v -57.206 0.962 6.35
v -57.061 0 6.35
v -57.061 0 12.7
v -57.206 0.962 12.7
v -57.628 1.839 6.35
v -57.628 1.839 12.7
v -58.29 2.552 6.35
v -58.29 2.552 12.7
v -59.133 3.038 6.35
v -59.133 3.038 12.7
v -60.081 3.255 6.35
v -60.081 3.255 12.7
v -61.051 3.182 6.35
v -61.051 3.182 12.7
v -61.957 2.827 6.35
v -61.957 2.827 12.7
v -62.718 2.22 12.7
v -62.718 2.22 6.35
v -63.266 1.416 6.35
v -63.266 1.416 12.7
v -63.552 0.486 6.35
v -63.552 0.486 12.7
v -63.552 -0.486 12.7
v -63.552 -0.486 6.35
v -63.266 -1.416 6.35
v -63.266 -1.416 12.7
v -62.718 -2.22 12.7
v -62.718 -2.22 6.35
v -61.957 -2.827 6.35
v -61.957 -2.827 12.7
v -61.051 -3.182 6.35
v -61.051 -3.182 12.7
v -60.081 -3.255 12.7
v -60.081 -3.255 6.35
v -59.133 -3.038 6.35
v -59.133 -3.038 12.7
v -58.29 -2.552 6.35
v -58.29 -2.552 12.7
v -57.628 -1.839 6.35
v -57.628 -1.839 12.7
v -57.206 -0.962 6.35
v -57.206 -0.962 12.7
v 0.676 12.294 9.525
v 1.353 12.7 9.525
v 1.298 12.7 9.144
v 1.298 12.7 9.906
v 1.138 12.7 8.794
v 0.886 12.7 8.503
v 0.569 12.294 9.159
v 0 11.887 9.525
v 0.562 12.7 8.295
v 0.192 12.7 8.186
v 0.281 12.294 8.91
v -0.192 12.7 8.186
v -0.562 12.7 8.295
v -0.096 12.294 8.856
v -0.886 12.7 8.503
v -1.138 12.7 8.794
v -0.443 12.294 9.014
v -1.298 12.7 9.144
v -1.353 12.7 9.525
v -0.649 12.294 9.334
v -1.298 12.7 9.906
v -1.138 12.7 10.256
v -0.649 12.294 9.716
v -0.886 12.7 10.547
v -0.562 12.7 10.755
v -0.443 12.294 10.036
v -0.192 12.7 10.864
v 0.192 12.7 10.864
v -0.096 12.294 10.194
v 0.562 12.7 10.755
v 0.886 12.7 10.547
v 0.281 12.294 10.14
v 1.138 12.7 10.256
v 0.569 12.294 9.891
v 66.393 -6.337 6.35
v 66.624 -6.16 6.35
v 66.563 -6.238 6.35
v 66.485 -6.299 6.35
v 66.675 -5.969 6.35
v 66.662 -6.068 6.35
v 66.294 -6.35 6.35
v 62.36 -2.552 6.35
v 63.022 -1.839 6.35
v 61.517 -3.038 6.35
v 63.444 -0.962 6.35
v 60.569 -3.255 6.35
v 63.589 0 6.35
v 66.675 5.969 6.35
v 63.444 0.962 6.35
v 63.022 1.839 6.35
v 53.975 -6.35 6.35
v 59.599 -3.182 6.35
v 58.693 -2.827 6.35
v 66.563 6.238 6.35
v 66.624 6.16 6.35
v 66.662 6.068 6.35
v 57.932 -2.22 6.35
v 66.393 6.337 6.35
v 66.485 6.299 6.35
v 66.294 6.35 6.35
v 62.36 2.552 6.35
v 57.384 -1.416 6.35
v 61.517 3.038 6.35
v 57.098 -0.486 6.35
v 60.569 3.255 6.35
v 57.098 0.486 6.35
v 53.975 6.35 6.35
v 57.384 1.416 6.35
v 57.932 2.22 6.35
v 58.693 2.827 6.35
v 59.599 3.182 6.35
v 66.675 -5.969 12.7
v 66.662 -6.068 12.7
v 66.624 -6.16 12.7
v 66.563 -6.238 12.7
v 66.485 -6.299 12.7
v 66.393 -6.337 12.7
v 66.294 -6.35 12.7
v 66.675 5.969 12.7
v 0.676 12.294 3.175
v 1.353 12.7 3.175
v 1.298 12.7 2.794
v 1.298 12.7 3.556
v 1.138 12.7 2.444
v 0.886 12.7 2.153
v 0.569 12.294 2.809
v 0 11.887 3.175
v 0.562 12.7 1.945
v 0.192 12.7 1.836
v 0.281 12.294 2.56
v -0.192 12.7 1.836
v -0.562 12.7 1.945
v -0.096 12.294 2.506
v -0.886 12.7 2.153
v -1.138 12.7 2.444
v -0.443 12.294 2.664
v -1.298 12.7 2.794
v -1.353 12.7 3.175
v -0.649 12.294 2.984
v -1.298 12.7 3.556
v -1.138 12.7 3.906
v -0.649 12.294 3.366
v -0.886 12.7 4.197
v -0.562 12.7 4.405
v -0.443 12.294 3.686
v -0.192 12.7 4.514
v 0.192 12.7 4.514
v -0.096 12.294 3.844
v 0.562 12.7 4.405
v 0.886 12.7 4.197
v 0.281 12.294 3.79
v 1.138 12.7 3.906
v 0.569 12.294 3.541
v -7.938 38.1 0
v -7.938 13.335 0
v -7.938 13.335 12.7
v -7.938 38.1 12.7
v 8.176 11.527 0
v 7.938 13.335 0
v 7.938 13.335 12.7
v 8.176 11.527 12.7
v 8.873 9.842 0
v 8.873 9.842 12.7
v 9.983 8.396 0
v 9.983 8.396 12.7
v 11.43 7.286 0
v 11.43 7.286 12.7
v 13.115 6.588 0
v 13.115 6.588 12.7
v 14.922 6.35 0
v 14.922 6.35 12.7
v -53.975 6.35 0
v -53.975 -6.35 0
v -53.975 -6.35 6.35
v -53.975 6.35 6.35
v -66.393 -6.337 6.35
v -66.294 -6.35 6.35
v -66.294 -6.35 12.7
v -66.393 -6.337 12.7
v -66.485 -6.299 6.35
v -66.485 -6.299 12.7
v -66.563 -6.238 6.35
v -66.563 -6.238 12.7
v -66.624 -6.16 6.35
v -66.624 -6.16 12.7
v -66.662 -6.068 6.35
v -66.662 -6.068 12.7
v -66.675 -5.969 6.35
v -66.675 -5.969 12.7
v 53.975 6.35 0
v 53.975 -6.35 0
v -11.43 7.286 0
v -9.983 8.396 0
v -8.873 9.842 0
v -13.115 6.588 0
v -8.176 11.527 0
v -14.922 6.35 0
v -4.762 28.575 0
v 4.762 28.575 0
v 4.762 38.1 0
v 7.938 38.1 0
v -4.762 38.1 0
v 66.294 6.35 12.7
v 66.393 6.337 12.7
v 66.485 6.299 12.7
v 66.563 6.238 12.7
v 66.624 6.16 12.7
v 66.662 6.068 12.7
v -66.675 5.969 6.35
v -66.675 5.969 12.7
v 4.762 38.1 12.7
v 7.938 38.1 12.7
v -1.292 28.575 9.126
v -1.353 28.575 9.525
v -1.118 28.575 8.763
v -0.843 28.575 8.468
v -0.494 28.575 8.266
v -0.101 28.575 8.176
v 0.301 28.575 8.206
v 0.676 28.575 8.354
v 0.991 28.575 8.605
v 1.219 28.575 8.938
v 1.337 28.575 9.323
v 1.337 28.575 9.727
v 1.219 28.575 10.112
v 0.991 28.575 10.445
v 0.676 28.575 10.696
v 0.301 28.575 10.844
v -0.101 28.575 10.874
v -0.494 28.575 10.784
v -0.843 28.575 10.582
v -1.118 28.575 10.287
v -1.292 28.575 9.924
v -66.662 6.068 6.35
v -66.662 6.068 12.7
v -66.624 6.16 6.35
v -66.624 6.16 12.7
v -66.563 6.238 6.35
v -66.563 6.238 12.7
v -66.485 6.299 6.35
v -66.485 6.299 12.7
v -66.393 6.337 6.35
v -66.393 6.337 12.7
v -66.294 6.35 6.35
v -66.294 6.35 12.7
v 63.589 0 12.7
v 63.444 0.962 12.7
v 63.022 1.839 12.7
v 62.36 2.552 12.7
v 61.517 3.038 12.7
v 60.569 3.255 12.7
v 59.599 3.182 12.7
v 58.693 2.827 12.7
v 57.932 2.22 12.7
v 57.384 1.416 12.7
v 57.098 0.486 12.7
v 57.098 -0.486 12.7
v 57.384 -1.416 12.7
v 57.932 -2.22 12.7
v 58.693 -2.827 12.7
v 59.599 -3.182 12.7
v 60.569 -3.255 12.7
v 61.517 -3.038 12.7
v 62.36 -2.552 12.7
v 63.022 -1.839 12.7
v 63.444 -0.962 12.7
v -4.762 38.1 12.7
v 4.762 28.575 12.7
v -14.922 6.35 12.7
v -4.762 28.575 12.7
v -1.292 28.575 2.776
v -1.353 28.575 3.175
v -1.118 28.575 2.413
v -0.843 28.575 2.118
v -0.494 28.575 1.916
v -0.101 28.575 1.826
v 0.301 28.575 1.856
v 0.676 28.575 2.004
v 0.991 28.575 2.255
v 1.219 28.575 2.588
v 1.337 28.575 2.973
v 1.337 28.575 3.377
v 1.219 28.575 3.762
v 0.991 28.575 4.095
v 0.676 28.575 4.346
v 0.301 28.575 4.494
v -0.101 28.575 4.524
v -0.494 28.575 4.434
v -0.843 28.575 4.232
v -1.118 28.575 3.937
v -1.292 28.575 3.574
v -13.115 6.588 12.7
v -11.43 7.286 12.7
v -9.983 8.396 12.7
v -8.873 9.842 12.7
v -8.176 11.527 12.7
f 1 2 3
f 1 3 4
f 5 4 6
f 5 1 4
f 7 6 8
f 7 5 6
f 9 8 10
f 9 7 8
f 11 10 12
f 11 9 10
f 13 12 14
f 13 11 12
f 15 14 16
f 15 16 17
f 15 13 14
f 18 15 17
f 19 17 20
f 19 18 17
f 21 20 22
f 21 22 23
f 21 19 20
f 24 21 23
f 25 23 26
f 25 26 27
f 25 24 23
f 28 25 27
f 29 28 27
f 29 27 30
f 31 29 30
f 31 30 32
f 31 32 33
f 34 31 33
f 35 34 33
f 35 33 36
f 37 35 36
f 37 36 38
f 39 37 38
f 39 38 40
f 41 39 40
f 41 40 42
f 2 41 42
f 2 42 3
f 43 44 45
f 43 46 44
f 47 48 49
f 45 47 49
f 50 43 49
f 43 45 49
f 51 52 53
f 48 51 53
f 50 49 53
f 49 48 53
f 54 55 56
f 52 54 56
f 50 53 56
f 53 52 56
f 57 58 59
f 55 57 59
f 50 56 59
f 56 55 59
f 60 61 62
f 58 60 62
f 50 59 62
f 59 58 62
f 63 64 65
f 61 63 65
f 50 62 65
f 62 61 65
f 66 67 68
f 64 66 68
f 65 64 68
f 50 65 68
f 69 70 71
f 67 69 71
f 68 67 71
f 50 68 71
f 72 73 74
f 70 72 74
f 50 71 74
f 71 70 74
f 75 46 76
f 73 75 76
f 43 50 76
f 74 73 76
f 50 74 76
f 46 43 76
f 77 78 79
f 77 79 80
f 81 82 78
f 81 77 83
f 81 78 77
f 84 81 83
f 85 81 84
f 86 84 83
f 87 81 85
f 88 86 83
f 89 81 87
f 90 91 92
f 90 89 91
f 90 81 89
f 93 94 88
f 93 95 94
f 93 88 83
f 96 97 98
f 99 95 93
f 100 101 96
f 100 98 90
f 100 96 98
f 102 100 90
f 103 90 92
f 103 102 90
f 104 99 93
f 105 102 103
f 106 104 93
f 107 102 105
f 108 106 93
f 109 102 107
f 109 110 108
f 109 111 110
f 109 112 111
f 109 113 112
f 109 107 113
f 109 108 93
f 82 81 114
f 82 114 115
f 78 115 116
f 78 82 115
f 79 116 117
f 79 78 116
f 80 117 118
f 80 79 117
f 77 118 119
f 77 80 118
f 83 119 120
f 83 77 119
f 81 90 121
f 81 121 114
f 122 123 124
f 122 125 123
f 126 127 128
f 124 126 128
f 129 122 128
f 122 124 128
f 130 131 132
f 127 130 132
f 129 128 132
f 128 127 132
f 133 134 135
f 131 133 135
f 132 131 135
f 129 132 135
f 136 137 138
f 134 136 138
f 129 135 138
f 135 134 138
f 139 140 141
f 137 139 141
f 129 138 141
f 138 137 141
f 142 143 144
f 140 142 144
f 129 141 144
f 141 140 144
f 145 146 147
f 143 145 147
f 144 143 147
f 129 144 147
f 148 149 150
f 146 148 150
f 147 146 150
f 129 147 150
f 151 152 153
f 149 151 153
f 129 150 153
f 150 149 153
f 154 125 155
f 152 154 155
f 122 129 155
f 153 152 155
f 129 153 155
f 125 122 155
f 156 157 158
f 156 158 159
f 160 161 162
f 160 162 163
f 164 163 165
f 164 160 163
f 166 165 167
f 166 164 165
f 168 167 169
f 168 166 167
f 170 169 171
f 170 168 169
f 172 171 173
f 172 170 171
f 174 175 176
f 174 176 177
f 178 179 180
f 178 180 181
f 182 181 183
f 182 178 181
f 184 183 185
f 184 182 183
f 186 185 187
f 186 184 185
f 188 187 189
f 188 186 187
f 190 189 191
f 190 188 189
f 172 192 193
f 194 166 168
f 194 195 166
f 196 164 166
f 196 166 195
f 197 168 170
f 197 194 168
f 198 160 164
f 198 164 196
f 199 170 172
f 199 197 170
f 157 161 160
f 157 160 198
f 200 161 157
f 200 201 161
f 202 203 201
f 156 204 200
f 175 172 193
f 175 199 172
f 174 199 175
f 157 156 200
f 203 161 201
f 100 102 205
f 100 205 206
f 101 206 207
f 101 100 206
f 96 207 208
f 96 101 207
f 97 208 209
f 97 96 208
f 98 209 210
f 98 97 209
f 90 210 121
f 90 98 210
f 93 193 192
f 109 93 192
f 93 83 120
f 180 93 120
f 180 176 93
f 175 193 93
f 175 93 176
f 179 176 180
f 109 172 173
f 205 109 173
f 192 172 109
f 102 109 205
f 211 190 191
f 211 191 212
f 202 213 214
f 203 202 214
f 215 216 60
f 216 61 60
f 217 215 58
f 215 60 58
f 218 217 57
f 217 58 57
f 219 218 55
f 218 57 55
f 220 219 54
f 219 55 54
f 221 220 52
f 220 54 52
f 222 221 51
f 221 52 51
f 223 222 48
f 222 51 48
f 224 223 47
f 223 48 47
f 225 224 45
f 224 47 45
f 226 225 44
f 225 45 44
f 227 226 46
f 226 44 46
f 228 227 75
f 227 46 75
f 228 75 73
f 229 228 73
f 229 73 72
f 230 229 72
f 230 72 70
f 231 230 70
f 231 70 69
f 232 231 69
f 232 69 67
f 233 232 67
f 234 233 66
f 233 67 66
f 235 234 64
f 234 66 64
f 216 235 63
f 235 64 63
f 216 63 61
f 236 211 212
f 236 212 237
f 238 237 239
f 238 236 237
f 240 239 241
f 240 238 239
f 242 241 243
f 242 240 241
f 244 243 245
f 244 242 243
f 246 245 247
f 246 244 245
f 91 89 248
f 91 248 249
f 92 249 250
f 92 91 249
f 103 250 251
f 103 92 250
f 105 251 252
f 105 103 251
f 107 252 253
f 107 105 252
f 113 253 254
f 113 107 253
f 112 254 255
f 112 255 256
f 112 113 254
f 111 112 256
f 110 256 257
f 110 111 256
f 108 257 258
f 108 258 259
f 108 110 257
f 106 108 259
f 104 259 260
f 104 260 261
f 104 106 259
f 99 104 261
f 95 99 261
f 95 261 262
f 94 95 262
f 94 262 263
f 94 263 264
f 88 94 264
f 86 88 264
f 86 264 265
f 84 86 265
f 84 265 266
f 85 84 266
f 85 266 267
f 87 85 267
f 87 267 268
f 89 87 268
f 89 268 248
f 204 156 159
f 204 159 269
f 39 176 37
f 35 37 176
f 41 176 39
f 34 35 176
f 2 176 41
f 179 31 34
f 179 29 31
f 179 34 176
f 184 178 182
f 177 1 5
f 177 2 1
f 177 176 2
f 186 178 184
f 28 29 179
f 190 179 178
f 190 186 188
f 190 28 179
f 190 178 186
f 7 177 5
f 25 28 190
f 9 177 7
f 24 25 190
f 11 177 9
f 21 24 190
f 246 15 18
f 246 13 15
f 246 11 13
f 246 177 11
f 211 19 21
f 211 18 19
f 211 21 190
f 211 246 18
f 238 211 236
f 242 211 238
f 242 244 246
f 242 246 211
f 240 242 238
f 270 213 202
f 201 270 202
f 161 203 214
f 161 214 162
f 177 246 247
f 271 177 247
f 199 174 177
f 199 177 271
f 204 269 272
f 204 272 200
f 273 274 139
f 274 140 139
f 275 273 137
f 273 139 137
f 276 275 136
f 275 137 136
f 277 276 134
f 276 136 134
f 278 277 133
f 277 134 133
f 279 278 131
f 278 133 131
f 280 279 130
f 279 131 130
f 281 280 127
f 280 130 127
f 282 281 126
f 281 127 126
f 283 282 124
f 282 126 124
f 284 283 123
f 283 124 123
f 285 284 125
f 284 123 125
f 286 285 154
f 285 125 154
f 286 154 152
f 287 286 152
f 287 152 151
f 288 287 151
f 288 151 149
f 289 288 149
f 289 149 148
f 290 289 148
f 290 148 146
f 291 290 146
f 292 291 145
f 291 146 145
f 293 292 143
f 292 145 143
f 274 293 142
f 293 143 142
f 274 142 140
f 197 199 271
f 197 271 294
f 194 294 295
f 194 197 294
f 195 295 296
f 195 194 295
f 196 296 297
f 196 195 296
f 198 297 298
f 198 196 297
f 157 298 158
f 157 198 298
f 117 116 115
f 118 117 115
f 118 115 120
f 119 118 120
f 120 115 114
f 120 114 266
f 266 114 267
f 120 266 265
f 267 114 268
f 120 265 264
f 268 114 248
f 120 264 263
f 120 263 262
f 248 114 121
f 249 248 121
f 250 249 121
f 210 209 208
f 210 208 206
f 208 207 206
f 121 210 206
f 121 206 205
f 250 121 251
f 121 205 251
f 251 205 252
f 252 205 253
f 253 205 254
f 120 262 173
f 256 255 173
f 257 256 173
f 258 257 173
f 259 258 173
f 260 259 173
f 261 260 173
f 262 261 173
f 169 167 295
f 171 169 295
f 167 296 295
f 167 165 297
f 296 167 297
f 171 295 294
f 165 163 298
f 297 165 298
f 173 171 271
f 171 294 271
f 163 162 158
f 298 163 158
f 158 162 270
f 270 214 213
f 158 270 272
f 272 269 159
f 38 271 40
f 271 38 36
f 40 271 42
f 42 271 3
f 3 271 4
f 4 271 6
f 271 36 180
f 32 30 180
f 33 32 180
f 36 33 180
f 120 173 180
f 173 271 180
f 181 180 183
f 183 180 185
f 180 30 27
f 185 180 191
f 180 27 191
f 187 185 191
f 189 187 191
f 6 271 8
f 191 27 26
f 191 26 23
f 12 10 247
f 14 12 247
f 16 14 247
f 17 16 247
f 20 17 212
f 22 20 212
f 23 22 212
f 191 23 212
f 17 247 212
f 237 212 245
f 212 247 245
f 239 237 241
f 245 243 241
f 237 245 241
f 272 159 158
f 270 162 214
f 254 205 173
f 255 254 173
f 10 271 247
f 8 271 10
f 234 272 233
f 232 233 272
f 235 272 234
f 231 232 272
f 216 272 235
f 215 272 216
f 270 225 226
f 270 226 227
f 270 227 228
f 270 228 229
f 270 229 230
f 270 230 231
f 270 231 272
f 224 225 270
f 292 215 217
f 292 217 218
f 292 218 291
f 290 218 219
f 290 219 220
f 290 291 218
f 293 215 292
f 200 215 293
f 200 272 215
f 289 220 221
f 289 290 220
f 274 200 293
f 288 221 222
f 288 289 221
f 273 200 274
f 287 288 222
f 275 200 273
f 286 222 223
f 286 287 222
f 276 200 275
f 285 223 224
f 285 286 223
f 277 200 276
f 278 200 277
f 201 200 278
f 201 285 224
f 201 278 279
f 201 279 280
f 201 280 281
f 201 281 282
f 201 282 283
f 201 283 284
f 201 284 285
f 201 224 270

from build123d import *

# Parameters (mm, degrees)
SKETCH1_R                 = 3.2639
BOSS_EXTRUDE1_DEPTH       = 12.7
SKETCH2_W                 = 12.7
SKETCH2_H                 = 12.7
CUT_EXTRUDE1_DEPTH        = 6.35
SKETCH3_W                 = 9.525
SKETCH3_H                 = 12.7
CUT_EXTRUDE2_DEPTH        = 9.525
F_6_32_TAPPED_HOLE1_D     = 2.7051
F_6_32_TAPPED_HOLE1_DEPTH = 15.875
F_6_32_TAPPED_HOLE1_TIP   = 0.81269403


with BuildPart() as part:
    # Sketch1 → Boss-Extrude1 (new body)
    with BuildSketch(Plane.XY):
        with BuildLine():
            Line((-7.9375, 13.335), (-7.9375, 38.1))
            Line((-7.9375, 38.1), (7.9375, 38.1))
            Line((7.9375, 38.1), (7.9375, 13.335))
            ThreePointArc((7.9375, 13.335), (9.983359133, 8.395859133), (14.9225, 6.35))
            Line((14.9225, 6.35), (66.294, 6.35))
            ThreePointArc((66.294, 6.35), (66.563407684, 6.238407684), (66.675, 5.969))
            Line((66.675, 5.969), (66.675, -5.969))
            ThreePointArc((66.675, -5.969), (66.563407684, -6.238407684), (66.294, -6.35))
            Line((66.294, -6.35), (-66.294, -6.35))
            ThreePointArc((-66.294, -6.35), (-66.563407684, -6.238407684), (-66.675, -5.969))
            Line((-66.675, -5.969), (-66.675, 5.969))
            ThreePointArc((-66.675, 5.969), (-66.563407684, 6.238407684), (-66.294, 6.35))
            Line((-66.294, 6.35), (-14.9225, 6.35))
            ThreePointArc((-14.9225, 6.35), (-9.983359133, 8.395859133), (-7.9375, 13.335))
        make_face()
        with Locations((-60.325, 0)):
            Circle(SKETCH1_R, mode=Mode.SUBTRACT)
        with Locations((60.325, 0)):
            Circle(SKETCH1_R, mode=Mode.SUBTRACT)
    extrude(amount=BOSS_EXTRUDE1_DEPTH)

    # Sketch2 → Cut-Extrude1 (cut)
    with BuildSketch(Plane(origin=(0, 0, 0), x_dir=(-1, 0, 0), z_dir=(0, 0, -1))):
        with Locations((-60.325, 0)):
            Rectangle(SKETCH2_W, SKETCH2_H)
        with Locations((60.325, 0)):
            Rectangle(SKETCH2_W, SKETCH2_H)
    extrude(amount=-CUT_EXTRUDE1_DEPTH, mode=Mode.SUBTRACT)

    # Sketch3 → Cut-Extrude2 (cut)
    with BuildSketch(Plane(origin=(0, 38.1, 0), x_dir=(1, 0, 0), z_dir=(0, 1, 0))):
        with Locations((0, -6.35)):
            Rectangle(SKETCH3_W, SKETCH3_H)
    extrude(amount=-CUT_EXTRUDE2_DEPTH, mode=Mode.SUBTRACT)

    # #6-32 Tapped Hole1
    with Locations(Plane(origin=(0, 28.575, 0), x_dir=(1, 0, 0), z_dir=(0, 1, 0))):
        with Locations((0, -3.175), (0, -9.525)):
            Hole(F_6_32_TAPPED_HOLE1_D / 2, depth=F_6_32_TAPPED_HOLE1_DEPTH)
            with Locations((0, 0, -(F_6_32_TAPPED_HOLE1_DEPTH + F_6_32_TAPPED_HOLE1_TIP / 2))):  # 118° drill point
                Cone(0, F_6_32_TAPPED_HOLE1_D / 2, F_6_32_TAPPED_HOLE1_TIP, mode=Mode.SUBTRACT)


solid = part.part
